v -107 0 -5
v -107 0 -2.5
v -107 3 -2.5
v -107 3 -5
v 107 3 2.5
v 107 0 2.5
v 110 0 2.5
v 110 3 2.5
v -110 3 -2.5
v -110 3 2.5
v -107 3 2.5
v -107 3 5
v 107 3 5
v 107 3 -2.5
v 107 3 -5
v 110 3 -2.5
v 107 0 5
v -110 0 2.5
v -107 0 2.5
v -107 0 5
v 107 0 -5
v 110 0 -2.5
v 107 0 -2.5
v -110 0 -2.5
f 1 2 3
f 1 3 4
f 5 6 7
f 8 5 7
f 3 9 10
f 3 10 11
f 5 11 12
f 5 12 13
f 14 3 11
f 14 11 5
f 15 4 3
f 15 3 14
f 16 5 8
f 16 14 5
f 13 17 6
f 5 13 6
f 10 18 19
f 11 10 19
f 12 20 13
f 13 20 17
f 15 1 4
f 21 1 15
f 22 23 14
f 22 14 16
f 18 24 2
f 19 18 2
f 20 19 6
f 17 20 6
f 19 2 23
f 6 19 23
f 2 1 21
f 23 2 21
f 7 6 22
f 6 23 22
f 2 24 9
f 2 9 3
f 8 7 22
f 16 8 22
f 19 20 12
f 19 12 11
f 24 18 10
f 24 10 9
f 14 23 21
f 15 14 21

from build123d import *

# Parameters (mm, degrees)
CROQUIS1_W              = 3
CROQUIS1_H              = 5
CROQUIS1_W_2            = 214
CROQUIS1_H_2            = 10
SALIENTE_EXTRUIR1_DEPTH = 3


with BuildPart() as part:
    # Croquis1 → Saliente-Extruir1 (new body)
    with BuildSketch(Plane(origin=(0, 0, 0), x_dir=(1, 0, 0), z_dir=(0, 1, 0))):
        with Locations((108.5, 0)):
            Rectangle(CROQUIS1_W, CROQUIS1_H)
        Rectangle(CROQUIS1_W_2, CROQUIS1_H_2)
        with Locations((-108.5, 0)):
            Rectangle(CROQUIS1_W, CROQUIS1_H)
    extrude(amount=SALIENTE_EXTRUIR1_DEPTH)


solid = part.part
